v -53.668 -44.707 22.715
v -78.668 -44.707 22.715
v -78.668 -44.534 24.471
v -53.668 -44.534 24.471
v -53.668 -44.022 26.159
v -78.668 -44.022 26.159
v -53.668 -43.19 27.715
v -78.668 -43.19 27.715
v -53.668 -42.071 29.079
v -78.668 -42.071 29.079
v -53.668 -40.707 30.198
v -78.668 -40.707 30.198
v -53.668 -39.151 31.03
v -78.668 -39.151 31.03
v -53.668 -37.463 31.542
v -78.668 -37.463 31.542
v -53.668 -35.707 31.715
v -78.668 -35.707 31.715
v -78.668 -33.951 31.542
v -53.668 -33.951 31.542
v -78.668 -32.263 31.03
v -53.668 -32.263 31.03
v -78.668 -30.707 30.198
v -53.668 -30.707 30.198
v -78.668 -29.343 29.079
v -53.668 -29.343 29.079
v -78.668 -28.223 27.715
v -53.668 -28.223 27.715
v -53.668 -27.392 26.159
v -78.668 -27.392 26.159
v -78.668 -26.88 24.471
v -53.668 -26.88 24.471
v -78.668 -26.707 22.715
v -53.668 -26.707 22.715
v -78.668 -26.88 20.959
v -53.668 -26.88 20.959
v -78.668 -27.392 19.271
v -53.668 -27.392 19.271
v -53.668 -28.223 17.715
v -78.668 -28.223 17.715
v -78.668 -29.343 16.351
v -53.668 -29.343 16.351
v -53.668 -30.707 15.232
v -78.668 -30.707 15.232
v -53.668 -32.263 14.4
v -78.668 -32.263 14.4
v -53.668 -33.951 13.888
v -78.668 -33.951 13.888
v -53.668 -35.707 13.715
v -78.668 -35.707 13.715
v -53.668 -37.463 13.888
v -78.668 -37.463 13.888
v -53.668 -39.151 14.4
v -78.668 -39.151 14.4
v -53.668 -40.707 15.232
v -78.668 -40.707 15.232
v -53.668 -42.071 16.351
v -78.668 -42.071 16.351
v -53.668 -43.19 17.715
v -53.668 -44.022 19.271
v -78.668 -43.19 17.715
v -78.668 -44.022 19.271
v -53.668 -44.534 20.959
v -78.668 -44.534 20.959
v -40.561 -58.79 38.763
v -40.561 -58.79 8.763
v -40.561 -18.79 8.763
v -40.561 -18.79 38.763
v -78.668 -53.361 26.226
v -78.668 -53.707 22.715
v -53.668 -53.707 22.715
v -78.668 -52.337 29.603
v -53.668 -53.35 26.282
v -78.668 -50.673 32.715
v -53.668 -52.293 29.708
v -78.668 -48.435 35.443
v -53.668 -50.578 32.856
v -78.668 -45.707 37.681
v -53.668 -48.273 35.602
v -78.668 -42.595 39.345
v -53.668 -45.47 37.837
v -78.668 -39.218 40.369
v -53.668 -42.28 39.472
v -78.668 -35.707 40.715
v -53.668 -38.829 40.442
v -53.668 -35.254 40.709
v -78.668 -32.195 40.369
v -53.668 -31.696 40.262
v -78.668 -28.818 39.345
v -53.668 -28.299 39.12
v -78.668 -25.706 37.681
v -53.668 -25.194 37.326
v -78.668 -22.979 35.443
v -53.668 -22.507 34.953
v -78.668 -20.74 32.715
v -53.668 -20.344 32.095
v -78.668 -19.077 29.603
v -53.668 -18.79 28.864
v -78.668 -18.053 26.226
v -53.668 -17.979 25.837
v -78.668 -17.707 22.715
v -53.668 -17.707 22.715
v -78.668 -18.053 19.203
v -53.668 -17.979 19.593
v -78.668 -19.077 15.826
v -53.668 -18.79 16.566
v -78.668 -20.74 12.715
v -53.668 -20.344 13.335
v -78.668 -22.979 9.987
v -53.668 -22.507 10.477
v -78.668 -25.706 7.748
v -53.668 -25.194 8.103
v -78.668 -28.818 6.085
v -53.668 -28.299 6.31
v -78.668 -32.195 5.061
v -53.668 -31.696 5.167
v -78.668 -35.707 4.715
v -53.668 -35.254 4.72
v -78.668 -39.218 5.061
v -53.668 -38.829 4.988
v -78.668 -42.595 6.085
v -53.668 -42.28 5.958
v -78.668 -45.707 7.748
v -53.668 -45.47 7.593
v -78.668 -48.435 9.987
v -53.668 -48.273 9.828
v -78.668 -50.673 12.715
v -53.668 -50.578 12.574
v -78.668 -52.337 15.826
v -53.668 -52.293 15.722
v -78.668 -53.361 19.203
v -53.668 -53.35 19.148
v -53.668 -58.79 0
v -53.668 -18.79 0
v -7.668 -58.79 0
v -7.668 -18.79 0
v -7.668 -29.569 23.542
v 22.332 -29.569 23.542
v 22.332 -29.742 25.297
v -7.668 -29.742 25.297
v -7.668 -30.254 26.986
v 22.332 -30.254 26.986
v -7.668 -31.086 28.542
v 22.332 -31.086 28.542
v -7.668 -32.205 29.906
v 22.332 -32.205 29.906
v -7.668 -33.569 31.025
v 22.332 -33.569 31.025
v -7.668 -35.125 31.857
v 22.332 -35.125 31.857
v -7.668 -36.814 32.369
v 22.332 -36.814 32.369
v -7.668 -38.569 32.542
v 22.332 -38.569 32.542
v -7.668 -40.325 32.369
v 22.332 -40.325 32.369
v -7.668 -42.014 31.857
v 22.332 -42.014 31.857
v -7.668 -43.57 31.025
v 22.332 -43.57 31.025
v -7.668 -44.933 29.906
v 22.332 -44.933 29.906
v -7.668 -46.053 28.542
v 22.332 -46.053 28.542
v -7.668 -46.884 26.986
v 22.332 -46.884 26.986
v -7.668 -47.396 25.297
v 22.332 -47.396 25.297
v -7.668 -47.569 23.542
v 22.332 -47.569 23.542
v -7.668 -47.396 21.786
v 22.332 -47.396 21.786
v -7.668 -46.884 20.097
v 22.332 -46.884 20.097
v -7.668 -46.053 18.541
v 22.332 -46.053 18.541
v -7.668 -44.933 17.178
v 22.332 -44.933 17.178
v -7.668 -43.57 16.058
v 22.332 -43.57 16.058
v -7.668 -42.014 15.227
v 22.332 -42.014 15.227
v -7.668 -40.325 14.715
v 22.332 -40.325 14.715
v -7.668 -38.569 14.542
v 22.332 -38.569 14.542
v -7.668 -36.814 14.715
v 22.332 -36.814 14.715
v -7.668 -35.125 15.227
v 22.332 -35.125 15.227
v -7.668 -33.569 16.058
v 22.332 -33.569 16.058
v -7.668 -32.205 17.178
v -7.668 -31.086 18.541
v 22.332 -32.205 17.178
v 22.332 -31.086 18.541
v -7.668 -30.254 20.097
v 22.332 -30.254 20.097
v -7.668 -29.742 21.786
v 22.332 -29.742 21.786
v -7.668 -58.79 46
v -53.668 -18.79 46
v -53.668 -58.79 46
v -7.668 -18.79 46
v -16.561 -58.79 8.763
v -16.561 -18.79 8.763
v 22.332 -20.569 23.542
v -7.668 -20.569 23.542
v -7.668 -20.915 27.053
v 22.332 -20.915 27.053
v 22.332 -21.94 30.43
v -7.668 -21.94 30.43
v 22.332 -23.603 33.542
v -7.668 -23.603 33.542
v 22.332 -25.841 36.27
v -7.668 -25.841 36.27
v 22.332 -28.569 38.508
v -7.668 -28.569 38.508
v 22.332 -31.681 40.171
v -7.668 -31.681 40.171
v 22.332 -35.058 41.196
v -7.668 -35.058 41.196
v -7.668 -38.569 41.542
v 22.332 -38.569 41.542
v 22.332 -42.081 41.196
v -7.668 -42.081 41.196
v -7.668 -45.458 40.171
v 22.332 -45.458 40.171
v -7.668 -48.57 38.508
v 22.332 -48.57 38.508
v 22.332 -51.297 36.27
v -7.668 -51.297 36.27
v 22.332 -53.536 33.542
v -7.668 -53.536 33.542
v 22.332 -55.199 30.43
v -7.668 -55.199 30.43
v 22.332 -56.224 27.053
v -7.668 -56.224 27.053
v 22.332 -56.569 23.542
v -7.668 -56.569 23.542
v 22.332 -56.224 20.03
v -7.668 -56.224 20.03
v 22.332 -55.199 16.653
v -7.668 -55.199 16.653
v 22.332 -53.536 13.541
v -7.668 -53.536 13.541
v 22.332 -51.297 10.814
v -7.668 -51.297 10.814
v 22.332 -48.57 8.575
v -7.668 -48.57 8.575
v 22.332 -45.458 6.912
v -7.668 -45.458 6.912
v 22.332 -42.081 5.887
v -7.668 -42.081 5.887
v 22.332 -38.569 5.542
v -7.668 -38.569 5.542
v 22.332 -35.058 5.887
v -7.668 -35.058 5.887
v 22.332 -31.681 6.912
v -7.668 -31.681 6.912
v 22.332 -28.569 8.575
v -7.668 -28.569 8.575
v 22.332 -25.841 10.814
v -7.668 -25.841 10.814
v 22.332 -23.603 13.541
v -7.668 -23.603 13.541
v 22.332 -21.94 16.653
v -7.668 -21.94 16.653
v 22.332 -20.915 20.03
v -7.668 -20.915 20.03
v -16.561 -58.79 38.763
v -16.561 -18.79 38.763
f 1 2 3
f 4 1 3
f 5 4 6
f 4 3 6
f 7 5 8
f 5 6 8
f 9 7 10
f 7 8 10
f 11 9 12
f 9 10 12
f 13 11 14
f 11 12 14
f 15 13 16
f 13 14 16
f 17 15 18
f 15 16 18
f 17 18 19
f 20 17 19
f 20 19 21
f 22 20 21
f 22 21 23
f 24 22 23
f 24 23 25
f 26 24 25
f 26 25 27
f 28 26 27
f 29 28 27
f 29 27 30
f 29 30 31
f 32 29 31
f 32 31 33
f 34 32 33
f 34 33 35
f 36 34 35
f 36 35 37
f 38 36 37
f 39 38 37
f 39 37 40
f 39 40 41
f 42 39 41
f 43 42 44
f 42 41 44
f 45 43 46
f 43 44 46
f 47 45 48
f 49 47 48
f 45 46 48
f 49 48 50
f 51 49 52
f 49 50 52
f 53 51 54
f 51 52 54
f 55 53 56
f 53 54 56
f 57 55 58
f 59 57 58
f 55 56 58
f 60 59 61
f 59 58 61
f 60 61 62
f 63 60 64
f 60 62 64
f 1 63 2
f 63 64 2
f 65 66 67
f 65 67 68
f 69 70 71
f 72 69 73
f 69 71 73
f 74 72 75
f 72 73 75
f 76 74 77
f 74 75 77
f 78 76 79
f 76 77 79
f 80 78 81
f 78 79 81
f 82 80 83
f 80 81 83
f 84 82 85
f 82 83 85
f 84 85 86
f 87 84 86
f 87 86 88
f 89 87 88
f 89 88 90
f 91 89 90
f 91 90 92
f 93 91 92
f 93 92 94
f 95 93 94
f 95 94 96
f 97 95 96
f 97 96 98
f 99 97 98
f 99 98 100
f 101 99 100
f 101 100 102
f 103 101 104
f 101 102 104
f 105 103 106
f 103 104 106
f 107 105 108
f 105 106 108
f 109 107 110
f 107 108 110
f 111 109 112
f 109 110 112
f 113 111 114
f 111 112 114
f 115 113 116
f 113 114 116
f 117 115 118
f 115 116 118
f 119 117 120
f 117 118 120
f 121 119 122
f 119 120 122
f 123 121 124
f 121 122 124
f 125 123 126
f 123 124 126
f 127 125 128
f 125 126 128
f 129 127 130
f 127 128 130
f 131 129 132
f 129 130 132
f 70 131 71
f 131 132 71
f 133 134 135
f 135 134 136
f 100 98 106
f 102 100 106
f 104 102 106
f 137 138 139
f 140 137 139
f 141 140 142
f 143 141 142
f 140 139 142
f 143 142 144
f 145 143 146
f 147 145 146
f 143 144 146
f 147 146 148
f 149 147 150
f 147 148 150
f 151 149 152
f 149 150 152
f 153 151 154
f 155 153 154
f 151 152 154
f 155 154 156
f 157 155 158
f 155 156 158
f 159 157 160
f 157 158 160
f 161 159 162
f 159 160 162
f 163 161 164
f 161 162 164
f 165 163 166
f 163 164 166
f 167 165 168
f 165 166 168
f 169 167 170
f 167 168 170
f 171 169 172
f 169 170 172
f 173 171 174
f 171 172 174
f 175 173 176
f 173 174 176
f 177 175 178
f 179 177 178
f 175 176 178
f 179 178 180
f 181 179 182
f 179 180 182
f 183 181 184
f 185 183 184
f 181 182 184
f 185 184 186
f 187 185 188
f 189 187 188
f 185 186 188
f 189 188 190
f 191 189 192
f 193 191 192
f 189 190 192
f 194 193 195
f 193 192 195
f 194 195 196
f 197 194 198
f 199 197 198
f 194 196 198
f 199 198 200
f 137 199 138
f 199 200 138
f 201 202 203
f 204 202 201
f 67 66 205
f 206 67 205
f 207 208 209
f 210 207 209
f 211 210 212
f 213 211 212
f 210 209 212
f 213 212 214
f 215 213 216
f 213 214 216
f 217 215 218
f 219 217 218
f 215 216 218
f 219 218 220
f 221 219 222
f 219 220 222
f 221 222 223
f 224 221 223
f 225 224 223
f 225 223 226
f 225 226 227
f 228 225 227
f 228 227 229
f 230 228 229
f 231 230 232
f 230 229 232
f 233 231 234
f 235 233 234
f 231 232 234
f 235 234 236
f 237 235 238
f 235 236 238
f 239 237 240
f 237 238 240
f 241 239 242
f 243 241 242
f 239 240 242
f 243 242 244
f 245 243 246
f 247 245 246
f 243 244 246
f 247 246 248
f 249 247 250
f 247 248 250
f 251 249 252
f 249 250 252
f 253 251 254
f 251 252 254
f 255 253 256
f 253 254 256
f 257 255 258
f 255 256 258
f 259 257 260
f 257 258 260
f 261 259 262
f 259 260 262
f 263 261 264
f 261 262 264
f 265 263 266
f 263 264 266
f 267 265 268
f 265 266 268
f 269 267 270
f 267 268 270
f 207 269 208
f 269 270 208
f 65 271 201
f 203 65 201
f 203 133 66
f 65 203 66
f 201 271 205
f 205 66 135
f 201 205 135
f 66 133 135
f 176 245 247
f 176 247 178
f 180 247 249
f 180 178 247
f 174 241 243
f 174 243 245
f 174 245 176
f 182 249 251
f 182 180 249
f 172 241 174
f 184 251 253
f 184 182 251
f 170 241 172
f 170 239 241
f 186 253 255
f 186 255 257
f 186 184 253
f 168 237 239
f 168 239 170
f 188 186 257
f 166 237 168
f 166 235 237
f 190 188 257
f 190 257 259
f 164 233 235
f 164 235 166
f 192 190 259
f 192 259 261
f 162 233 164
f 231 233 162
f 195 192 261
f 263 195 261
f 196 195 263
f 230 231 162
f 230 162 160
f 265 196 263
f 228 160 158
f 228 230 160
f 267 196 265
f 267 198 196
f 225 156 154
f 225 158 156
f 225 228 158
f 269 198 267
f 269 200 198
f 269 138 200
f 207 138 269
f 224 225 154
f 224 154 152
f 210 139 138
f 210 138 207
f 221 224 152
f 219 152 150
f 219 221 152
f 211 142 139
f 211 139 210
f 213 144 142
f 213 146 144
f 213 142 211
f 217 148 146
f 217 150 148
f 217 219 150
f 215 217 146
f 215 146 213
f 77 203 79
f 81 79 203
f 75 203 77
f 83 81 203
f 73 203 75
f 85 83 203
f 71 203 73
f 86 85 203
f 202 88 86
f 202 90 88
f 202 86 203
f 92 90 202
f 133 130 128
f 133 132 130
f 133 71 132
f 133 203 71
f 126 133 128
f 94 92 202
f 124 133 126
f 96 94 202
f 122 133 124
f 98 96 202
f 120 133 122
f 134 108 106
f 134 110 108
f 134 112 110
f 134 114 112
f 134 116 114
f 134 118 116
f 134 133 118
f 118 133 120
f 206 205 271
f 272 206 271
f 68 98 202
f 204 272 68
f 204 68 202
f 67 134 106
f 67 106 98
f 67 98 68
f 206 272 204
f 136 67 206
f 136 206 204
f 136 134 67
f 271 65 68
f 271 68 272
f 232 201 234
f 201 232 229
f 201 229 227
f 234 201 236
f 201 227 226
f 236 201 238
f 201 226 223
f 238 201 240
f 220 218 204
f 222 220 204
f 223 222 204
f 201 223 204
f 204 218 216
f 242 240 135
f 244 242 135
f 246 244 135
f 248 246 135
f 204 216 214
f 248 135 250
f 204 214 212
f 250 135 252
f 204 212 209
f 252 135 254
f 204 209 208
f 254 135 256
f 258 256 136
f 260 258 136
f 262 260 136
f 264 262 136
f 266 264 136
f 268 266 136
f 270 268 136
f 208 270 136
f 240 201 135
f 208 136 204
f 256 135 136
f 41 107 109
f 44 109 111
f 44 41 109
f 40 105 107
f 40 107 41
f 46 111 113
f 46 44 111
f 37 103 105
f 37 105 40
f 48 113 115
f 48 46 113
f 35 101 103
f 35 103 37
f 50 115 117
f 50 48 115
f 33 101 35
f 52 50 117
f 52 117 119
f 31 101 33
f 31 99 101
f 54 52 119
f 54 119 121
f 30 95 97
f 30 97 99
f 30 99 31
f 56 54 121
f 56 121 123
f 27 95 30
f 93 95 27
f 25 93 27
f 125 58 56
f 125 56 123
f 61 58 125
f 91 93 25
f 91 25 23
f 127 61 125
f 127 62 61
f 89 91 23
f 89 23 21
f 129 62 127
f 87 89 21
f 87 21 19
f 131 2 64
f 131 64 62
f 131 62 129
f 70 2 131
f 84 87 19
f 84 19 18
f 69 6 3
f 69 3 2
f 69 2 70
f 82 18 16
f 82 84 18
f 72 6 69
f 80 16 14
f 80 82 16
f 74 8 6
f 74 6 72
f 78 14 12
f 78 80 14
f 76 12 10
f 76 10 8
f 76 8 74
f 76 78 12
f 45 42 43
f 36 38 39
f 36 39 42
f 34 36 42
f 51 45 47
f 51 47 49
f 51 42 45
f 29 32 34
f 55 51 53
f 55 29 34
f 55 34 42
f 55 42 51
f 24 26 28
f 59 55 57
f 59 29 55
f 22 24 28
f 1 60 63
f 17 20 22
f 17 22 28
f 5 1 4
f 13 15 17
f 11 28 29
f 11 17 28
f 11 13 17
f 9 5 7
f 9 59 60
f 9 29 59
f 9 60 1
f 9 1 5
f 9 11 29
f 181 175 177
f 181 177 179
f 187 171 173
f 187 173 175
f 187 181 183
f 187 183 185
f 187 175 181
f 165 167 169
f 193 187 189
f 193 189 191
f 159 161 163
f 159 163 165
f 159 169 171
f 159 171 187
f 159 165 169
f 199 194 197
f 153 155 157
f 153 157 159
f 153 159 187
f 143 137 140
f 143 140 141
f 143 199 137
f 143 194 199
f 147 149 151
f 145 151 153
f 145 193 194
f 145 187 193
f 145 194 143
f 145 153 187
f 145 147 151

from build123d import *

# Parameters (mm, degrees)
F0_W      = 46
F0_H      = 40
F1_DEPTH  = 46
F2_R      = 9
F3_DEPTH  = 30
F4_R      = 9
F5_DEPTH  = 30
F6_W      = 24
F6_H      = 30
F7_DEPTH  = 46
F9_R      = 18
F10_DEPTH = 25
F8_R      = 9
F11_DEPTH = 30
F12_R     = 18
F13_DEPTH = 30
F14_R     = 9
F15_DEPTH = 30


with BuildPart() as f1:
    # F0 (on Top) → F1 (new body)
    with BuildSketch(Plane.XY):
        with Locations((-30.6679215729, -38.7895996869)):
            Rectangle(F0_W, F0_H)
    extrude(amount=F1_DEPTH)

    # F2 (on face) → F3 (join)
    with BuildSketch(Plane(origin=(-53.6679215729, 0, 0), x_dir=(0, -1, 0), z_dir=(-1, 0, 0))):
        with Locations((35.7066951692, 22.7147787809)):
            Circle(F2_R)
    extrude(amount=F3_DEPTH)

    # F4 (on face) → F5 (join)
    with BuildSketch(Plane.YZ.offset(-7.6679215729)):
        with Locations((-38.5694056749, 23.5416200012)):
            Circle(F4_R)
    extrude(amount=F5_DEPTH)

    # F6 (on face) → F7 (cut)
    with BuildSketch(Plane.XZ.offset(58.7895996869)):
        with Locations((-28.5605824441, 23.7626548484)):
            Rectangle(F6_W, F6_H)
    extrude(amount=-F7_DEPTH, mode=Mode.SUBTRACT)

    # F9 (on face) → F10 (join)
    with BuildSketch(Plane(origin=(-53.6679215729, 0, 0), x_dir=(0, -1, 0), z_dir=(-1, 0, 0))):
        with Locations((35.7066951692, 22.7147787809)):
            Circle(F9_R)
    extrude(amount=F10_DEPTH)

    # F8 (on face) → F11 (cut)
    with BuildSketch(Plane(origin=(-83.6679215729, 0, 0), x_dir=(0, -1, 0), z_dir=(-1, 0, 0))):
        with Locations((35.7066951692, 22.7147787809)):
            Circle(F8_R)
    extrude(amount=-F11_DEPTH, mode=Mode.SUBTRACT)

    # F12 (on face) → F13 (join)
    with BuildSketch(Plane.YZ.offset(-7.6679215729)):
        with Locations((-38.5694056749, 23.5416200012)):
            Circle(F12_R)
    extrude(amount=F13_DEPTH)

    # F14 (on face) → F15 (cut)
    with BuildSketch(Plane.YZ.offset(22.3320784271)):
        with Locations((-38.5694056749, 23.5416200012)):
            Circle(F14_R)
    extrude(amount=-F15_DEPTH, mode=Mode.SUBTRACT)


solid = f1.part
